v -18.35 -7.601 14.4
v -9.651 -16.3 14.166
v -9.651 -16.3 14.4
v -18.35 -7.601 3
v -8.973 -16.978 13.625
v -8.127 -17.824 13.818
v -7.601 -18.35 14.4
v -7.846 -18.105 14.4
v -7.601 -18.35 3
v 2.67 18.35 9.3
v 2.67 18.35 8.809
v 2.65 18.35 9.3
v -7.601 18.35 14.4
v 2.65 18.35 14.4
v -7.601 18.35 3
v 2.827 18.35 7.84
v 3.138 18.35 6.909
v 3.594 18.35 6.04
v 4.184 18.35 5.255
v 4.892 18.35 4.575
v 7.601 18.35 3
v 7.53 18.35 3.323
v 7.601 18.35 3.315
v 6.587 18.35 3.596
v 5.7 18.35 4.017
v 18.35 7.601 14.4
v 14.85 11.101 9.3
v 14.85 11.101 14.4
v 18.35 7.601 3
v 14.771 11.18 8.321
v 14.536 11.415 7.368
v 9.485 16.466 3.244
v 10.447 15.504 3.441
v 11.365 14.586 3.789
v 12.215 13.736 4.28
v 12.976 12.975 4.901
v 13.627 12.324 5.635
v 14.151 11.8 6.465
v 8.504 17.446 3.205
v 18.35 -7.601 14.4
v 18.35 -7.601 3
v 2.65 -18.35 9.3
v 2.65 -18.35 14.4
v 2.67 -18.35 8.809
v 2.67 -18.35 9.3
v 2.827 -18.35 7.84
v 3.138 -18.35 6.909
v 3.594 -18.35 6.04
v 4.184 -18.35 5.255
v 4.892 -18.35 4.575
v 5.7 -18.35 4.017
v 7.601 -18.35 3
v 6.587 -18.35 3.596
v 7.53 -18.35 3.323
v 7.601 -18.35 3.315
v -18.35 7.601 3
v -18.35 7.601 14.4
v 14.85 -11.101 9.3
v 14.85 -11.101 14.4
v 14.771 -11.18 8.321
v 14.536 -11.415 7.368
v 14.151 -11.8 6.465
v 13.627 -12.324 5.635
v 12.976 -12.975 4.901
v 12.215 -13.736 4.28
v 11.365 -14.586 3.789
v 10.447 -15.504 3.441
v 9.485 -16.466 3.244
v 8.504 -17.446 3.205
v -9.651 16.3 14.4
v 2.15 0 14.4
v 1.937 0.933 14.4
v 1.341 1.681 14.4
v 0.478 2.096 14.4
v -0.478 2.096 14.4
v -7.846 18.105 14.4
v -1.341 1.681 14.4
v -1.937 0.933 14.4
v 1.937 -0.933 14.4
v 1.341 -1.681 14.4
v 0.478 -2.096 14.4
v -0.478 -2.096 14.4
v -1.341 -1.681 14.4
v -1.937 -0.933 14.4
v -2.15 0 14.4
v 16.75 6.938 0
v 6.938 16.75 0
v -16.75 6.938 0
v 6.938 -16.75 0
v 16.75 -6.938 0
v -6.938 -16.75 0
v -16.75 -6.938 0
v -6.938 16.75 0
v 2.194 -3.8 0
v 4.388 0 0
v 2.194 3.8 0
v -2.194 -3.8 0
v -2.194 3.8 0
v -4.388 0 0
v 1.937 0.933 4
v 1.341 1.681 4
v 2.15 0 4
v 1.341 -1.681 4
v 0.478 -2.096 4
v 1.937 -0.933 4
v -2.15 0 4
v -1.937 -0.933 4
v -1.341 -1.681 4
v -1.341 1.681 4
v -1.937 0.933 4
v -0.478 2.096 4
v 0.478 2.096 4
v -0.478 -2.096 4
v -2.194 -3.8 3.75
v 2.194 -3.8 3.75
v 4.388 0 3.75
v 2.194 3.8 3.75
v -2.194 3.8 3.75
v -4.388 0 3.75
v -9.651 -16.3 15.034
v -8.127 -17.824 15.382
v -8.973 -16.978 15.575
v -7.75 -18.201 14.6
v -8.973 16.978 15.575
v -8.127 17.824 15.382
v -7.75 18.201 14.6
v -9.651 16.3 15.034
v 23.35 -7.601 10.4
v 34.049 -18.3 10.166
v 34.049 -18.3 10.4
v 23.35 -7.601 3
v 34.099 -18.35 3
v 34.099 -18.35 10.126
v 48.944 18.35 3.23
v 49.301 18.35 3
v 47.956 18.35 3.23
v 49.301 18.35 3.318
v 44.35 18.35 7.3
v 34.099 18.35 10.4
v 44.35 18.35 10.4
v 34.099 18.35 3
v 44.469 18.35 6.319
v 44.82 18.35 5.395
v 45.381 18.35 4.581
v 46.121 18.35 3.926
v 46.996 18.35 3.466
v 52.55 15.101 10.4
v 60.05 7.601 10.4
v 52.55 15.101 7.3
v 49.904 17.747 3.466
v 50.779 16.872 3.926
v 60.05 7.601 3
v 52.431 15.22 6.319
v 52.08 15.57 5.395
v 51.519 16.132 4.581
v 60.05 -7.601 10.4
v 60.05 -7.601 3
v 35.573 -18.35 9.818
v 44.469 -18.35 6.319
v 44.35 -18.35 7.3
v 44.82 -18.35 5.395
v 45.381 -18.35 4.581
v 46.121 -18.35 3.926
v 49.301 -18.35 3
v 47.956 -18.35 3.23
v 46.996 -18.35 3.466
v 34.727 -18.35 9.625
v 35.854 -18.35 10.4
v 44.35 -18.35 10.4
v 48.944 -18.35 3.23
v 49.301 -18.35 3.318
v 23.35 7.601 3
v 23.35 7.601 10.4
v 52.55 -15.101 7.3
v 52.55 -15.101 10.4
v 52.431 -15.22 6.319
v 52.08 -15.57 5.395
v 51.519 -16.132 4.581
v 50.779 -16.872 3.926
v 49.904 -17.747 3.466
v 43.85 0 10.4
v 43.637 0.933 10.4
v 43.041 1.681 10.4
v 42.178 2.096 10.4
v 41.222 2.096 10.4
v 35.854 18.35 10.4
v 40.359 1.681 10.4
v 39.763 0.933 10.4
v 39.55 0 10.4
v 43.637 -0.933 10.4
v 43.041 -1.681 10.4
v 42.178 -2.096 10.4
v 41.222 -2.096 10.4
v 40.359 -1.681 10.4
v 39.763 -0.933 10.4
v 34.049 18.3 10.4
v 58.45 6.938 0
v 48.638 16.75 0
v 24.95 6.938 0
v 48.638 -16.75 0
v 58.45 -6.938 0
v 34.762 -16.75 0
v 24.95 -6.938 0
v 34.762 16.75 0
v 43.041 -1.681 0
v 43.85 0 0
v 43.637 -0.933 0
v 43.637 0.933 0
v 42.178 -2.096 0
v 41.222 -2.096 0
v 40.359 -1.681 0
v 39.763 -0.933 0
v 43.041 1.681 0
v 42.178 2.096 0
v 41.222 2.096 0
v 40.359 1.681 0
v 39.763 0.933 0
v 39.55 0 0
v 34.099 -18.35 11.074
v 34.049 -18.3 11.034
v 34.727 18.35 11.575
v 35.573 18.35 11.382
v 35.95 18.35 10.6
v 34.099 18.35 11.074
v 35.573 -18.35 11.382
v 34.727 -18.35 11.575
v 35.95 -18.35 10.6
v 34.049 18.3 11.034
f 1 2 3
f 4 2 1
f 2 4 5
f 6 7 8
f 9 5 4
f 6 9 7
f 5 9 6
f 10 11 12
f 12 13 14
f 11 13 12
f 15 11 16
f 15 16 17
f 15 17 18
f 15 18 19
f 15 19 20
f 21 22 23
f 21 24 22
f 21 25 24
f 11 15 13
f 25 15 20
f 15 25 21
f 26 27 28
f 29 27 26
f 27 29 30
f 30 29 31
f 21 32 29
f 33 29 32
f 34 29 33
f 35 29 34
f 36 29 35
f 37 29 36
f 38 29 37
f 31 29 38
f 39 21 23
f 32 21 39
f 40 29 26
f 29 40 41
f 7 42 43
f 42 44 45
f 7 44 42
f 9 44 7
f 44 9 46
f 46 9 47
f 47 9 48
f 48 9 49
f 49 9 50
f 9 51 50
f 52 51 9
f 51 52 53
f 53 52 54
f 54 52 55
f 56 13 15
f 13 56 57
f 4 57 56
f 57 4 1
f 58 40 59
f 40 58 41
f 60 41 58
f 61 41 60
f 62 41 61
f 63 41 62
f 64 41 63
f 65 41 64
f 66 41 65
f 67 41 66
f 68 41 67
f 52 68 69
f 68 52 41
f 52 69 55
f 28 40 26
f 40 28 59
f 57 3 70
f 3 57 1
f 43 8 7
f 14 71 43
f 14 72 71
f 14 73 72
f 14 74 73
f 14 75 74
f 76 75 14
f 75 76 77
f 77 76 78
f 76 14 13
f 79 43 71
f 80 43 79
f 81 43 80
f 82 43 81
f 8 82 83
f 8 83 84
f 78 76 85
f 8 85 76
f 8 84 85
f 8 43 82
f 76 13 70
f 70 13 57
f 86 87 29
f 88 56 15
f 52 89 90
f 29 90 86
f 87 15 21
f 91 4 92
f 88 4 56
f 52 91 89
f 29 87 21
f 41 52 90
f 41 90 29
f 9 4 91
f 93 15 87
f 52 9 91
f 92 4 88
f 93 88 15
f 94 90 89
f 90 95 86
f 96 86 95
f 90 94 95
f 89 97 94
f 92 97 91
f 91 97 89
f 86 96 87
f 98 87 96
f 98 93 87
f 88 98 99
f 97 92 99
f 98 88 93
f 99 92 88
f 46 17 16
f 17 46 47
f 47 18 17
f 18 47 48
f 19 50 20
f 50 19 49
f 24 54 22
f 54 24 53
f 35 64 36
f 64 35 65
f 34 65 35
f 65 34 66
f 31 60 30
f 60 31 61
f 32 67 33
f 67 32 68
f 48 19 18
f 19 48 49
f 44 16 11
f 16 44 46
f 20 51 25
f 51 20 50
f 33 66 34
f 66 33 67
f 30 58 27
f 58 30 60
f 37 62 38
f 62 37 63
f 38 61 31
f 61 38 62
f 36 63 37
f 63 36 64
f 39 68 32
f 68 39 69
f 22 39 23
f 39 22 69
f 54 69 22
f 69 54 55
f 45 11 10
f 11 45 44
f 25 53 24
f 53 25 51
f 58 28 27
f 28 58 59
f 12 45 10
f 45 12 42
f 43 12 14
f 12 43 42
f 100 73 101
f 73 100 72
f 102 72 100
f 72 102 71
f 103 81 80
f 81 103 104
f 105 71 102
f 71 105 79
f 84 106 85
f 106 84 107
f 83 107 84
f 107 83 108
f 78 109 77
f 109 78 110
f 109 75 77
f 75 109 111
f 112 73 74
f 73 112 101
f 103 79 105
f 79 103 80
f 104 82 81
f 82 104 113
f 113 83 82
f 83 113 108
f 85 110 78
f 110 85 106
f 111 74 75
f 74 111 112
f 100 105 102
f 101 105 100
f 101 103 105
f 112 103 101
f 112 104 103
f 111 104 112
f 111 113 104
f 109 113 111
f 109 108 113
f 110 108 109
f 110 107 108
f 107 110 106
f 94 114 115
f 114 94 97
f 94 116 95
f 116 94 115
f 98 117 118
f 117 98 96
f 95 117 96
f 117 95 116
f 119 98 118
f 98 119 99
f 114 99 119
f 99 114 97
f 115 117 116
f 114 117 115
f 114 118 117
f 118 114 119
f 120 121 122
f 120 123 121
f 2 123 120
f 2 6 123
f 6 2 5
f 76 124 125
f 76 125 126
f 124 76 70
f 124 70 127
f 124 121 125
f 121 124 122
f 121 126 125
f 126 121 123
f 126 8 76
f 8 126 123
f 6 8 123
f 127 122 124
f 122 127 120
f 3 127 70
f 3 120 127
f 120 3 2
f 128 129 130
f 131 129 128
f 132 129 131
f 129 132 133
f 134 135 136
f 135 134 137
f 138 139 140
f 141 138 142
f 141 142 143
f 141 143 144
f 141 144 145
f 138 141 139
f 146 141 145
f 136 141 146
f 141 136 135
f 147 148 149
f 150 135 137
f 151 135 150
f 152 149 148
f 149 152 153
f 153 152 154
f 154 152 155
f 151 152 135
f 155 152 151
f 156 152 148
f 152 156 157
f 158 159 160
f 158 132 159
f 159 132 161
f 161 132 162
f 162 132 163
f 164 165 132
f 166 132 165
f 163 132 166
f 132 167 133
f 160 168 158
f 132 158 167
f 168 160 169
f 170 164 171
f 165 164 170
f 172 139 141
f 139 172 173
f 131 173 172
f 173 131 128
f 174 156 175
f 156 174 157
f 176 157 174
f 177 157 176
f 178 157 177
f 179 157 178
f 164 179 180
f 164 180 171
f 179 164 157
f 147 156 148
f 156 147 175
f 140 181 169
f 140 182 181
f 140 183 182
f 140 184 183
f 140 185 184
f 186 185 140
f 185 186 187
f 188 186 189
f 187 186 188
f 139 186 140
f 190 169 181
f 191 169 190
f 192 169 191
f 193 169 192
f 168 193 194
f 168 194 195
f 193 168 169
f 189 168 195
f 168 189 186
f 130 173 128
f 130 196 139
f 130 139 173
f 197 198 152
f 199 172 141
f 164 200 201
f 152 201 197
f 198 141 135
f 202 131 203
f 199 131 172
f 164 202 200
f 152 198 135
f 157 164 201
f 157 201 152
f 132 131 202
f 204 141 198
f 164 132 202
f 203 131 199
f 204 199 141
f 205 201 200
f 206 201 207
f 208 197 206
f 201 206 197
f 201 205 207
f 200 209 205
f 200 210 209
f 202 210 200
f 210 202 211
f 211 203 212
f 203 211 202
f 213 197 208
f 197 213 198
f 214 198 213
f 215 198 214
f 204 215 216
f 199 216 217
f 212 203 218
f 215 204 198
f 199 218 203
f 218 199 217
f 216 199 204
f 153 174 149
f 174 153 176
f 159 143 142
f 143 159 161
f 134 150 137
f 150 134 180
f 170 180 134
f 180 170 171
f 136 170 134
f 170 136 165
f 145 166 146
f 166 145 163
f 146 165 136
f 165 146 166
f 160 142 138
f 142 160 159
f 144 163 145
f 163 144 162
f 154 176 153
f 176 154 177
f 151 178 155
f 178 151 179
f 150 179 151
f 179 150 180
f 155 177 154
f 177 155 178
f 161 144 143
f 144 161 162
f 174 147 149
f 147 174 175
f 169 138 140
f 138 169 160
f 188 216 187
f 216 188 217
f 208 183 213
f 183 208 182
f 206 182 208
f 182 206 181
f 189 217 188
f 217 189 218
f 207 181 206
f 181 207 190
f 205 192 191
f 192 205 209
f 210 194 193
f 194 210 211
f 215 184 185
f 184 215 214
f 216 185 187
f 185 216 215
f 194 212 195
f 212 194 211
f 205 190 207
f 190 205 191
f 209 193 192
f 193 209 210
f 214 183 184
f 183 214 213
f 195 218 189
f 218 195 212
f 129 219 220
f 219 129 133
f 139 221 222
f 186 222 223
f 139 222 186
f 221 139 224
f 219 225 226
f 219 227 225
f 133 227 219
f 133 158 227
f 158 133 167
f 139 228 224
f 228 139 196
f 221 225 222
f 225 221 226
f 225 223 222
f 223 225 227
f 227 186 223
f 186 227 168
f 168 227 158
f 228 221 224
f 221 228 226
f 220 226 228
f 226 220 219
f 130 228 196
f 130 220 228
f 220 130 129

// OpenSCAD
/*
Author: Avp (Alexander Purikov)
Design is based on  http://www.thingiverse.com/thing:30328
Lisense is CC-BY-SA 3.0 (Creative commons Attribution-ShareAlike)

Avp:
 Code is rewritten almost completely -- only general part idea has retained. 
 Part is redisigned
  -- to be much easier to print
  -- to be possible to clamp rods with different diameter
  -- to avoid skewness.
 
*/

/*[Customizer Variables]*/

//Which part would you like to render?
part			=	"both"; //[part1:Part1, part2:Part2, both:Both]

//Diameter of Rod 1
Rod1Diameter = 12; //[6:20]

//Diameter of Rod 2
Rod2Diameter = 8; //[3:20]

//Screw type
NutName			=	"M4"; //[M3:M3, M4:M4, M6:M6]

/*[hidden]*/

CreateRidge = true;
Wall=3;
Gap=1;
ScrewSeparation=1;
Bevel = 3;
BevelAngle=30; //Too high angle is hard to print

M3=[5.5, 2.4, 3.0];
M4=[7.0, 3.2, 4.0];
M5=[7.0, 4.7, 5.0];
M6=[10.0, 5.2, 6.0];
M8=[13.0, 6.8, 8.0];
M10=[17.0, 8.4, 10.0];

UsedNut=( NutName == "M3" ) ? M3 : (( NutName == "M4" ) ? M4 : M6);

Clearance=0.2;
NutClearance=0.3;
o=0.05; // Little value, used to shift parts to avoid zero-width walls
MembraneThickness=0.2;

$fs=1;$fa=6;

function GetClampRadius () = max ( Rod1Diameter, Rod2Diameter) + Clearance + (UsedNut[2]+NutClearance)/2 + ScrewSeparation + Wall;

output();

module output()
{
	if (part == "part1") {
		ClampPart1();
	} else if (part == "part2") {
		ClampPart2();
	} else if (part == "both") {
		ClampPart1();
		translate([GetClampRadius()*2+5,0,0])
		ClampPart2();
	} 
}

module ClampPart1 ()
	{
	ClampPart ( Rod1Diameter+Clearance, max ( Rod1Diameter, Rod2Diameter)+Clearance );
	}
	
module ClampPart2 ()
	{
	ClampPart ( Rod2Diameter+Clearance, max ( Rod1Diameter, Rod2Diameter)+Clearance, CreateHexNut = false );
	}

	
module ClampPart( RodDiameter, MaxRodDiameter, CreateHexNut = true )
	{
	  OctagonInnerRadius = MaxRodDiameter + (UsedNut[2]+NutClearance)/2 + ScrewSeparation + Wall;
	  OctagonOuterRadius = OctagonInnerRadius/cos(180/8);
	  HWall=UsedNut[1]+MembraneThickness;
	  
	  difference() {
		
		  rotate([0,0,45/2])
			{
			// Main body
			translate([0,0,Bevel])
				cylinder(r=OctagonOuterRadius, h=RodDiameter+UsedNut[1]-Bevel-Gap, $fn=8);
				
			// Beveled body part	
			cylinder(r=OctagonOuterRadius-Bevel*tan(BevelAngle), r2=OctagonOuterRadius, h=Bevel, $fn=8);
				
			}
		
		// Rod slot
		translate([(RodDiameter+(UsedNut[2]+NutClearance)+ScrewSeparation)/2,0,UsedNut[1]+RodDiameter/2])
			{
			rotate ([90,0,0])
			cylinder(r=RodDiameter/2, h=80, center=true);
			translate([0,0,RodDiameter/2])
				{
				cube([RodDiameter, 100,RodDiameter], center=true);
				}
			}
		
		// Screw hole
		translate ([0,0,CreateHexNut ? UsedNut[1]+MembraneThickness+NutClearance*2 : -o] )	// Shift is made to leave a membrane above hex-slot to
			cylinder(r=(UsedNut[2]+NutClearance)/2 , h = 100 );		  						// make our thing easier to print.
		
		// Nut slot
		if ( CreateHexNut )
			{
			translate ([0,0,-o])
				NutSlot (UsedNut);
			}
		}

	  // Little (equal to Gap) ridge, parallel and symmetric to rod
	  if (CreateRidge)
		{
		translate ([0,0,RodDiameter+HWall-Gap])
		intersection ()
			{
			translate ([0,0,-Gap])
				rotate([0,0,45/2])
					cylinder(r=OctagonInnerRadius/cos(180/8), h=Gap*2, $fn=8);
			translate ([-(RodDiameter+(UsedNut[2]+NutClearance)+ScrewSeparation)/2,OctagonInnerRadius,0])
				rotate ([90,0,0])
					cylinder (r=Gap,h=OctagonInnerRadius*2);
		
			}
		}
	}

module NutSlot (Slot, SideOpen=false)
	{
	cylinder (r=(Slot[0]/2+NutClearance)*2/sqrt(3), h=Slot[1]+NutClearance*2, $fn=6);
	if ( SideOpen )
		translate ([0,-(Slot[0]+NutClearance*2)/2,0])
			cube ([Slot[0]+NutClearance*2+4,Slot[0]+NutClearance*2,Slot[1]+NutClearance*2]);
	}

